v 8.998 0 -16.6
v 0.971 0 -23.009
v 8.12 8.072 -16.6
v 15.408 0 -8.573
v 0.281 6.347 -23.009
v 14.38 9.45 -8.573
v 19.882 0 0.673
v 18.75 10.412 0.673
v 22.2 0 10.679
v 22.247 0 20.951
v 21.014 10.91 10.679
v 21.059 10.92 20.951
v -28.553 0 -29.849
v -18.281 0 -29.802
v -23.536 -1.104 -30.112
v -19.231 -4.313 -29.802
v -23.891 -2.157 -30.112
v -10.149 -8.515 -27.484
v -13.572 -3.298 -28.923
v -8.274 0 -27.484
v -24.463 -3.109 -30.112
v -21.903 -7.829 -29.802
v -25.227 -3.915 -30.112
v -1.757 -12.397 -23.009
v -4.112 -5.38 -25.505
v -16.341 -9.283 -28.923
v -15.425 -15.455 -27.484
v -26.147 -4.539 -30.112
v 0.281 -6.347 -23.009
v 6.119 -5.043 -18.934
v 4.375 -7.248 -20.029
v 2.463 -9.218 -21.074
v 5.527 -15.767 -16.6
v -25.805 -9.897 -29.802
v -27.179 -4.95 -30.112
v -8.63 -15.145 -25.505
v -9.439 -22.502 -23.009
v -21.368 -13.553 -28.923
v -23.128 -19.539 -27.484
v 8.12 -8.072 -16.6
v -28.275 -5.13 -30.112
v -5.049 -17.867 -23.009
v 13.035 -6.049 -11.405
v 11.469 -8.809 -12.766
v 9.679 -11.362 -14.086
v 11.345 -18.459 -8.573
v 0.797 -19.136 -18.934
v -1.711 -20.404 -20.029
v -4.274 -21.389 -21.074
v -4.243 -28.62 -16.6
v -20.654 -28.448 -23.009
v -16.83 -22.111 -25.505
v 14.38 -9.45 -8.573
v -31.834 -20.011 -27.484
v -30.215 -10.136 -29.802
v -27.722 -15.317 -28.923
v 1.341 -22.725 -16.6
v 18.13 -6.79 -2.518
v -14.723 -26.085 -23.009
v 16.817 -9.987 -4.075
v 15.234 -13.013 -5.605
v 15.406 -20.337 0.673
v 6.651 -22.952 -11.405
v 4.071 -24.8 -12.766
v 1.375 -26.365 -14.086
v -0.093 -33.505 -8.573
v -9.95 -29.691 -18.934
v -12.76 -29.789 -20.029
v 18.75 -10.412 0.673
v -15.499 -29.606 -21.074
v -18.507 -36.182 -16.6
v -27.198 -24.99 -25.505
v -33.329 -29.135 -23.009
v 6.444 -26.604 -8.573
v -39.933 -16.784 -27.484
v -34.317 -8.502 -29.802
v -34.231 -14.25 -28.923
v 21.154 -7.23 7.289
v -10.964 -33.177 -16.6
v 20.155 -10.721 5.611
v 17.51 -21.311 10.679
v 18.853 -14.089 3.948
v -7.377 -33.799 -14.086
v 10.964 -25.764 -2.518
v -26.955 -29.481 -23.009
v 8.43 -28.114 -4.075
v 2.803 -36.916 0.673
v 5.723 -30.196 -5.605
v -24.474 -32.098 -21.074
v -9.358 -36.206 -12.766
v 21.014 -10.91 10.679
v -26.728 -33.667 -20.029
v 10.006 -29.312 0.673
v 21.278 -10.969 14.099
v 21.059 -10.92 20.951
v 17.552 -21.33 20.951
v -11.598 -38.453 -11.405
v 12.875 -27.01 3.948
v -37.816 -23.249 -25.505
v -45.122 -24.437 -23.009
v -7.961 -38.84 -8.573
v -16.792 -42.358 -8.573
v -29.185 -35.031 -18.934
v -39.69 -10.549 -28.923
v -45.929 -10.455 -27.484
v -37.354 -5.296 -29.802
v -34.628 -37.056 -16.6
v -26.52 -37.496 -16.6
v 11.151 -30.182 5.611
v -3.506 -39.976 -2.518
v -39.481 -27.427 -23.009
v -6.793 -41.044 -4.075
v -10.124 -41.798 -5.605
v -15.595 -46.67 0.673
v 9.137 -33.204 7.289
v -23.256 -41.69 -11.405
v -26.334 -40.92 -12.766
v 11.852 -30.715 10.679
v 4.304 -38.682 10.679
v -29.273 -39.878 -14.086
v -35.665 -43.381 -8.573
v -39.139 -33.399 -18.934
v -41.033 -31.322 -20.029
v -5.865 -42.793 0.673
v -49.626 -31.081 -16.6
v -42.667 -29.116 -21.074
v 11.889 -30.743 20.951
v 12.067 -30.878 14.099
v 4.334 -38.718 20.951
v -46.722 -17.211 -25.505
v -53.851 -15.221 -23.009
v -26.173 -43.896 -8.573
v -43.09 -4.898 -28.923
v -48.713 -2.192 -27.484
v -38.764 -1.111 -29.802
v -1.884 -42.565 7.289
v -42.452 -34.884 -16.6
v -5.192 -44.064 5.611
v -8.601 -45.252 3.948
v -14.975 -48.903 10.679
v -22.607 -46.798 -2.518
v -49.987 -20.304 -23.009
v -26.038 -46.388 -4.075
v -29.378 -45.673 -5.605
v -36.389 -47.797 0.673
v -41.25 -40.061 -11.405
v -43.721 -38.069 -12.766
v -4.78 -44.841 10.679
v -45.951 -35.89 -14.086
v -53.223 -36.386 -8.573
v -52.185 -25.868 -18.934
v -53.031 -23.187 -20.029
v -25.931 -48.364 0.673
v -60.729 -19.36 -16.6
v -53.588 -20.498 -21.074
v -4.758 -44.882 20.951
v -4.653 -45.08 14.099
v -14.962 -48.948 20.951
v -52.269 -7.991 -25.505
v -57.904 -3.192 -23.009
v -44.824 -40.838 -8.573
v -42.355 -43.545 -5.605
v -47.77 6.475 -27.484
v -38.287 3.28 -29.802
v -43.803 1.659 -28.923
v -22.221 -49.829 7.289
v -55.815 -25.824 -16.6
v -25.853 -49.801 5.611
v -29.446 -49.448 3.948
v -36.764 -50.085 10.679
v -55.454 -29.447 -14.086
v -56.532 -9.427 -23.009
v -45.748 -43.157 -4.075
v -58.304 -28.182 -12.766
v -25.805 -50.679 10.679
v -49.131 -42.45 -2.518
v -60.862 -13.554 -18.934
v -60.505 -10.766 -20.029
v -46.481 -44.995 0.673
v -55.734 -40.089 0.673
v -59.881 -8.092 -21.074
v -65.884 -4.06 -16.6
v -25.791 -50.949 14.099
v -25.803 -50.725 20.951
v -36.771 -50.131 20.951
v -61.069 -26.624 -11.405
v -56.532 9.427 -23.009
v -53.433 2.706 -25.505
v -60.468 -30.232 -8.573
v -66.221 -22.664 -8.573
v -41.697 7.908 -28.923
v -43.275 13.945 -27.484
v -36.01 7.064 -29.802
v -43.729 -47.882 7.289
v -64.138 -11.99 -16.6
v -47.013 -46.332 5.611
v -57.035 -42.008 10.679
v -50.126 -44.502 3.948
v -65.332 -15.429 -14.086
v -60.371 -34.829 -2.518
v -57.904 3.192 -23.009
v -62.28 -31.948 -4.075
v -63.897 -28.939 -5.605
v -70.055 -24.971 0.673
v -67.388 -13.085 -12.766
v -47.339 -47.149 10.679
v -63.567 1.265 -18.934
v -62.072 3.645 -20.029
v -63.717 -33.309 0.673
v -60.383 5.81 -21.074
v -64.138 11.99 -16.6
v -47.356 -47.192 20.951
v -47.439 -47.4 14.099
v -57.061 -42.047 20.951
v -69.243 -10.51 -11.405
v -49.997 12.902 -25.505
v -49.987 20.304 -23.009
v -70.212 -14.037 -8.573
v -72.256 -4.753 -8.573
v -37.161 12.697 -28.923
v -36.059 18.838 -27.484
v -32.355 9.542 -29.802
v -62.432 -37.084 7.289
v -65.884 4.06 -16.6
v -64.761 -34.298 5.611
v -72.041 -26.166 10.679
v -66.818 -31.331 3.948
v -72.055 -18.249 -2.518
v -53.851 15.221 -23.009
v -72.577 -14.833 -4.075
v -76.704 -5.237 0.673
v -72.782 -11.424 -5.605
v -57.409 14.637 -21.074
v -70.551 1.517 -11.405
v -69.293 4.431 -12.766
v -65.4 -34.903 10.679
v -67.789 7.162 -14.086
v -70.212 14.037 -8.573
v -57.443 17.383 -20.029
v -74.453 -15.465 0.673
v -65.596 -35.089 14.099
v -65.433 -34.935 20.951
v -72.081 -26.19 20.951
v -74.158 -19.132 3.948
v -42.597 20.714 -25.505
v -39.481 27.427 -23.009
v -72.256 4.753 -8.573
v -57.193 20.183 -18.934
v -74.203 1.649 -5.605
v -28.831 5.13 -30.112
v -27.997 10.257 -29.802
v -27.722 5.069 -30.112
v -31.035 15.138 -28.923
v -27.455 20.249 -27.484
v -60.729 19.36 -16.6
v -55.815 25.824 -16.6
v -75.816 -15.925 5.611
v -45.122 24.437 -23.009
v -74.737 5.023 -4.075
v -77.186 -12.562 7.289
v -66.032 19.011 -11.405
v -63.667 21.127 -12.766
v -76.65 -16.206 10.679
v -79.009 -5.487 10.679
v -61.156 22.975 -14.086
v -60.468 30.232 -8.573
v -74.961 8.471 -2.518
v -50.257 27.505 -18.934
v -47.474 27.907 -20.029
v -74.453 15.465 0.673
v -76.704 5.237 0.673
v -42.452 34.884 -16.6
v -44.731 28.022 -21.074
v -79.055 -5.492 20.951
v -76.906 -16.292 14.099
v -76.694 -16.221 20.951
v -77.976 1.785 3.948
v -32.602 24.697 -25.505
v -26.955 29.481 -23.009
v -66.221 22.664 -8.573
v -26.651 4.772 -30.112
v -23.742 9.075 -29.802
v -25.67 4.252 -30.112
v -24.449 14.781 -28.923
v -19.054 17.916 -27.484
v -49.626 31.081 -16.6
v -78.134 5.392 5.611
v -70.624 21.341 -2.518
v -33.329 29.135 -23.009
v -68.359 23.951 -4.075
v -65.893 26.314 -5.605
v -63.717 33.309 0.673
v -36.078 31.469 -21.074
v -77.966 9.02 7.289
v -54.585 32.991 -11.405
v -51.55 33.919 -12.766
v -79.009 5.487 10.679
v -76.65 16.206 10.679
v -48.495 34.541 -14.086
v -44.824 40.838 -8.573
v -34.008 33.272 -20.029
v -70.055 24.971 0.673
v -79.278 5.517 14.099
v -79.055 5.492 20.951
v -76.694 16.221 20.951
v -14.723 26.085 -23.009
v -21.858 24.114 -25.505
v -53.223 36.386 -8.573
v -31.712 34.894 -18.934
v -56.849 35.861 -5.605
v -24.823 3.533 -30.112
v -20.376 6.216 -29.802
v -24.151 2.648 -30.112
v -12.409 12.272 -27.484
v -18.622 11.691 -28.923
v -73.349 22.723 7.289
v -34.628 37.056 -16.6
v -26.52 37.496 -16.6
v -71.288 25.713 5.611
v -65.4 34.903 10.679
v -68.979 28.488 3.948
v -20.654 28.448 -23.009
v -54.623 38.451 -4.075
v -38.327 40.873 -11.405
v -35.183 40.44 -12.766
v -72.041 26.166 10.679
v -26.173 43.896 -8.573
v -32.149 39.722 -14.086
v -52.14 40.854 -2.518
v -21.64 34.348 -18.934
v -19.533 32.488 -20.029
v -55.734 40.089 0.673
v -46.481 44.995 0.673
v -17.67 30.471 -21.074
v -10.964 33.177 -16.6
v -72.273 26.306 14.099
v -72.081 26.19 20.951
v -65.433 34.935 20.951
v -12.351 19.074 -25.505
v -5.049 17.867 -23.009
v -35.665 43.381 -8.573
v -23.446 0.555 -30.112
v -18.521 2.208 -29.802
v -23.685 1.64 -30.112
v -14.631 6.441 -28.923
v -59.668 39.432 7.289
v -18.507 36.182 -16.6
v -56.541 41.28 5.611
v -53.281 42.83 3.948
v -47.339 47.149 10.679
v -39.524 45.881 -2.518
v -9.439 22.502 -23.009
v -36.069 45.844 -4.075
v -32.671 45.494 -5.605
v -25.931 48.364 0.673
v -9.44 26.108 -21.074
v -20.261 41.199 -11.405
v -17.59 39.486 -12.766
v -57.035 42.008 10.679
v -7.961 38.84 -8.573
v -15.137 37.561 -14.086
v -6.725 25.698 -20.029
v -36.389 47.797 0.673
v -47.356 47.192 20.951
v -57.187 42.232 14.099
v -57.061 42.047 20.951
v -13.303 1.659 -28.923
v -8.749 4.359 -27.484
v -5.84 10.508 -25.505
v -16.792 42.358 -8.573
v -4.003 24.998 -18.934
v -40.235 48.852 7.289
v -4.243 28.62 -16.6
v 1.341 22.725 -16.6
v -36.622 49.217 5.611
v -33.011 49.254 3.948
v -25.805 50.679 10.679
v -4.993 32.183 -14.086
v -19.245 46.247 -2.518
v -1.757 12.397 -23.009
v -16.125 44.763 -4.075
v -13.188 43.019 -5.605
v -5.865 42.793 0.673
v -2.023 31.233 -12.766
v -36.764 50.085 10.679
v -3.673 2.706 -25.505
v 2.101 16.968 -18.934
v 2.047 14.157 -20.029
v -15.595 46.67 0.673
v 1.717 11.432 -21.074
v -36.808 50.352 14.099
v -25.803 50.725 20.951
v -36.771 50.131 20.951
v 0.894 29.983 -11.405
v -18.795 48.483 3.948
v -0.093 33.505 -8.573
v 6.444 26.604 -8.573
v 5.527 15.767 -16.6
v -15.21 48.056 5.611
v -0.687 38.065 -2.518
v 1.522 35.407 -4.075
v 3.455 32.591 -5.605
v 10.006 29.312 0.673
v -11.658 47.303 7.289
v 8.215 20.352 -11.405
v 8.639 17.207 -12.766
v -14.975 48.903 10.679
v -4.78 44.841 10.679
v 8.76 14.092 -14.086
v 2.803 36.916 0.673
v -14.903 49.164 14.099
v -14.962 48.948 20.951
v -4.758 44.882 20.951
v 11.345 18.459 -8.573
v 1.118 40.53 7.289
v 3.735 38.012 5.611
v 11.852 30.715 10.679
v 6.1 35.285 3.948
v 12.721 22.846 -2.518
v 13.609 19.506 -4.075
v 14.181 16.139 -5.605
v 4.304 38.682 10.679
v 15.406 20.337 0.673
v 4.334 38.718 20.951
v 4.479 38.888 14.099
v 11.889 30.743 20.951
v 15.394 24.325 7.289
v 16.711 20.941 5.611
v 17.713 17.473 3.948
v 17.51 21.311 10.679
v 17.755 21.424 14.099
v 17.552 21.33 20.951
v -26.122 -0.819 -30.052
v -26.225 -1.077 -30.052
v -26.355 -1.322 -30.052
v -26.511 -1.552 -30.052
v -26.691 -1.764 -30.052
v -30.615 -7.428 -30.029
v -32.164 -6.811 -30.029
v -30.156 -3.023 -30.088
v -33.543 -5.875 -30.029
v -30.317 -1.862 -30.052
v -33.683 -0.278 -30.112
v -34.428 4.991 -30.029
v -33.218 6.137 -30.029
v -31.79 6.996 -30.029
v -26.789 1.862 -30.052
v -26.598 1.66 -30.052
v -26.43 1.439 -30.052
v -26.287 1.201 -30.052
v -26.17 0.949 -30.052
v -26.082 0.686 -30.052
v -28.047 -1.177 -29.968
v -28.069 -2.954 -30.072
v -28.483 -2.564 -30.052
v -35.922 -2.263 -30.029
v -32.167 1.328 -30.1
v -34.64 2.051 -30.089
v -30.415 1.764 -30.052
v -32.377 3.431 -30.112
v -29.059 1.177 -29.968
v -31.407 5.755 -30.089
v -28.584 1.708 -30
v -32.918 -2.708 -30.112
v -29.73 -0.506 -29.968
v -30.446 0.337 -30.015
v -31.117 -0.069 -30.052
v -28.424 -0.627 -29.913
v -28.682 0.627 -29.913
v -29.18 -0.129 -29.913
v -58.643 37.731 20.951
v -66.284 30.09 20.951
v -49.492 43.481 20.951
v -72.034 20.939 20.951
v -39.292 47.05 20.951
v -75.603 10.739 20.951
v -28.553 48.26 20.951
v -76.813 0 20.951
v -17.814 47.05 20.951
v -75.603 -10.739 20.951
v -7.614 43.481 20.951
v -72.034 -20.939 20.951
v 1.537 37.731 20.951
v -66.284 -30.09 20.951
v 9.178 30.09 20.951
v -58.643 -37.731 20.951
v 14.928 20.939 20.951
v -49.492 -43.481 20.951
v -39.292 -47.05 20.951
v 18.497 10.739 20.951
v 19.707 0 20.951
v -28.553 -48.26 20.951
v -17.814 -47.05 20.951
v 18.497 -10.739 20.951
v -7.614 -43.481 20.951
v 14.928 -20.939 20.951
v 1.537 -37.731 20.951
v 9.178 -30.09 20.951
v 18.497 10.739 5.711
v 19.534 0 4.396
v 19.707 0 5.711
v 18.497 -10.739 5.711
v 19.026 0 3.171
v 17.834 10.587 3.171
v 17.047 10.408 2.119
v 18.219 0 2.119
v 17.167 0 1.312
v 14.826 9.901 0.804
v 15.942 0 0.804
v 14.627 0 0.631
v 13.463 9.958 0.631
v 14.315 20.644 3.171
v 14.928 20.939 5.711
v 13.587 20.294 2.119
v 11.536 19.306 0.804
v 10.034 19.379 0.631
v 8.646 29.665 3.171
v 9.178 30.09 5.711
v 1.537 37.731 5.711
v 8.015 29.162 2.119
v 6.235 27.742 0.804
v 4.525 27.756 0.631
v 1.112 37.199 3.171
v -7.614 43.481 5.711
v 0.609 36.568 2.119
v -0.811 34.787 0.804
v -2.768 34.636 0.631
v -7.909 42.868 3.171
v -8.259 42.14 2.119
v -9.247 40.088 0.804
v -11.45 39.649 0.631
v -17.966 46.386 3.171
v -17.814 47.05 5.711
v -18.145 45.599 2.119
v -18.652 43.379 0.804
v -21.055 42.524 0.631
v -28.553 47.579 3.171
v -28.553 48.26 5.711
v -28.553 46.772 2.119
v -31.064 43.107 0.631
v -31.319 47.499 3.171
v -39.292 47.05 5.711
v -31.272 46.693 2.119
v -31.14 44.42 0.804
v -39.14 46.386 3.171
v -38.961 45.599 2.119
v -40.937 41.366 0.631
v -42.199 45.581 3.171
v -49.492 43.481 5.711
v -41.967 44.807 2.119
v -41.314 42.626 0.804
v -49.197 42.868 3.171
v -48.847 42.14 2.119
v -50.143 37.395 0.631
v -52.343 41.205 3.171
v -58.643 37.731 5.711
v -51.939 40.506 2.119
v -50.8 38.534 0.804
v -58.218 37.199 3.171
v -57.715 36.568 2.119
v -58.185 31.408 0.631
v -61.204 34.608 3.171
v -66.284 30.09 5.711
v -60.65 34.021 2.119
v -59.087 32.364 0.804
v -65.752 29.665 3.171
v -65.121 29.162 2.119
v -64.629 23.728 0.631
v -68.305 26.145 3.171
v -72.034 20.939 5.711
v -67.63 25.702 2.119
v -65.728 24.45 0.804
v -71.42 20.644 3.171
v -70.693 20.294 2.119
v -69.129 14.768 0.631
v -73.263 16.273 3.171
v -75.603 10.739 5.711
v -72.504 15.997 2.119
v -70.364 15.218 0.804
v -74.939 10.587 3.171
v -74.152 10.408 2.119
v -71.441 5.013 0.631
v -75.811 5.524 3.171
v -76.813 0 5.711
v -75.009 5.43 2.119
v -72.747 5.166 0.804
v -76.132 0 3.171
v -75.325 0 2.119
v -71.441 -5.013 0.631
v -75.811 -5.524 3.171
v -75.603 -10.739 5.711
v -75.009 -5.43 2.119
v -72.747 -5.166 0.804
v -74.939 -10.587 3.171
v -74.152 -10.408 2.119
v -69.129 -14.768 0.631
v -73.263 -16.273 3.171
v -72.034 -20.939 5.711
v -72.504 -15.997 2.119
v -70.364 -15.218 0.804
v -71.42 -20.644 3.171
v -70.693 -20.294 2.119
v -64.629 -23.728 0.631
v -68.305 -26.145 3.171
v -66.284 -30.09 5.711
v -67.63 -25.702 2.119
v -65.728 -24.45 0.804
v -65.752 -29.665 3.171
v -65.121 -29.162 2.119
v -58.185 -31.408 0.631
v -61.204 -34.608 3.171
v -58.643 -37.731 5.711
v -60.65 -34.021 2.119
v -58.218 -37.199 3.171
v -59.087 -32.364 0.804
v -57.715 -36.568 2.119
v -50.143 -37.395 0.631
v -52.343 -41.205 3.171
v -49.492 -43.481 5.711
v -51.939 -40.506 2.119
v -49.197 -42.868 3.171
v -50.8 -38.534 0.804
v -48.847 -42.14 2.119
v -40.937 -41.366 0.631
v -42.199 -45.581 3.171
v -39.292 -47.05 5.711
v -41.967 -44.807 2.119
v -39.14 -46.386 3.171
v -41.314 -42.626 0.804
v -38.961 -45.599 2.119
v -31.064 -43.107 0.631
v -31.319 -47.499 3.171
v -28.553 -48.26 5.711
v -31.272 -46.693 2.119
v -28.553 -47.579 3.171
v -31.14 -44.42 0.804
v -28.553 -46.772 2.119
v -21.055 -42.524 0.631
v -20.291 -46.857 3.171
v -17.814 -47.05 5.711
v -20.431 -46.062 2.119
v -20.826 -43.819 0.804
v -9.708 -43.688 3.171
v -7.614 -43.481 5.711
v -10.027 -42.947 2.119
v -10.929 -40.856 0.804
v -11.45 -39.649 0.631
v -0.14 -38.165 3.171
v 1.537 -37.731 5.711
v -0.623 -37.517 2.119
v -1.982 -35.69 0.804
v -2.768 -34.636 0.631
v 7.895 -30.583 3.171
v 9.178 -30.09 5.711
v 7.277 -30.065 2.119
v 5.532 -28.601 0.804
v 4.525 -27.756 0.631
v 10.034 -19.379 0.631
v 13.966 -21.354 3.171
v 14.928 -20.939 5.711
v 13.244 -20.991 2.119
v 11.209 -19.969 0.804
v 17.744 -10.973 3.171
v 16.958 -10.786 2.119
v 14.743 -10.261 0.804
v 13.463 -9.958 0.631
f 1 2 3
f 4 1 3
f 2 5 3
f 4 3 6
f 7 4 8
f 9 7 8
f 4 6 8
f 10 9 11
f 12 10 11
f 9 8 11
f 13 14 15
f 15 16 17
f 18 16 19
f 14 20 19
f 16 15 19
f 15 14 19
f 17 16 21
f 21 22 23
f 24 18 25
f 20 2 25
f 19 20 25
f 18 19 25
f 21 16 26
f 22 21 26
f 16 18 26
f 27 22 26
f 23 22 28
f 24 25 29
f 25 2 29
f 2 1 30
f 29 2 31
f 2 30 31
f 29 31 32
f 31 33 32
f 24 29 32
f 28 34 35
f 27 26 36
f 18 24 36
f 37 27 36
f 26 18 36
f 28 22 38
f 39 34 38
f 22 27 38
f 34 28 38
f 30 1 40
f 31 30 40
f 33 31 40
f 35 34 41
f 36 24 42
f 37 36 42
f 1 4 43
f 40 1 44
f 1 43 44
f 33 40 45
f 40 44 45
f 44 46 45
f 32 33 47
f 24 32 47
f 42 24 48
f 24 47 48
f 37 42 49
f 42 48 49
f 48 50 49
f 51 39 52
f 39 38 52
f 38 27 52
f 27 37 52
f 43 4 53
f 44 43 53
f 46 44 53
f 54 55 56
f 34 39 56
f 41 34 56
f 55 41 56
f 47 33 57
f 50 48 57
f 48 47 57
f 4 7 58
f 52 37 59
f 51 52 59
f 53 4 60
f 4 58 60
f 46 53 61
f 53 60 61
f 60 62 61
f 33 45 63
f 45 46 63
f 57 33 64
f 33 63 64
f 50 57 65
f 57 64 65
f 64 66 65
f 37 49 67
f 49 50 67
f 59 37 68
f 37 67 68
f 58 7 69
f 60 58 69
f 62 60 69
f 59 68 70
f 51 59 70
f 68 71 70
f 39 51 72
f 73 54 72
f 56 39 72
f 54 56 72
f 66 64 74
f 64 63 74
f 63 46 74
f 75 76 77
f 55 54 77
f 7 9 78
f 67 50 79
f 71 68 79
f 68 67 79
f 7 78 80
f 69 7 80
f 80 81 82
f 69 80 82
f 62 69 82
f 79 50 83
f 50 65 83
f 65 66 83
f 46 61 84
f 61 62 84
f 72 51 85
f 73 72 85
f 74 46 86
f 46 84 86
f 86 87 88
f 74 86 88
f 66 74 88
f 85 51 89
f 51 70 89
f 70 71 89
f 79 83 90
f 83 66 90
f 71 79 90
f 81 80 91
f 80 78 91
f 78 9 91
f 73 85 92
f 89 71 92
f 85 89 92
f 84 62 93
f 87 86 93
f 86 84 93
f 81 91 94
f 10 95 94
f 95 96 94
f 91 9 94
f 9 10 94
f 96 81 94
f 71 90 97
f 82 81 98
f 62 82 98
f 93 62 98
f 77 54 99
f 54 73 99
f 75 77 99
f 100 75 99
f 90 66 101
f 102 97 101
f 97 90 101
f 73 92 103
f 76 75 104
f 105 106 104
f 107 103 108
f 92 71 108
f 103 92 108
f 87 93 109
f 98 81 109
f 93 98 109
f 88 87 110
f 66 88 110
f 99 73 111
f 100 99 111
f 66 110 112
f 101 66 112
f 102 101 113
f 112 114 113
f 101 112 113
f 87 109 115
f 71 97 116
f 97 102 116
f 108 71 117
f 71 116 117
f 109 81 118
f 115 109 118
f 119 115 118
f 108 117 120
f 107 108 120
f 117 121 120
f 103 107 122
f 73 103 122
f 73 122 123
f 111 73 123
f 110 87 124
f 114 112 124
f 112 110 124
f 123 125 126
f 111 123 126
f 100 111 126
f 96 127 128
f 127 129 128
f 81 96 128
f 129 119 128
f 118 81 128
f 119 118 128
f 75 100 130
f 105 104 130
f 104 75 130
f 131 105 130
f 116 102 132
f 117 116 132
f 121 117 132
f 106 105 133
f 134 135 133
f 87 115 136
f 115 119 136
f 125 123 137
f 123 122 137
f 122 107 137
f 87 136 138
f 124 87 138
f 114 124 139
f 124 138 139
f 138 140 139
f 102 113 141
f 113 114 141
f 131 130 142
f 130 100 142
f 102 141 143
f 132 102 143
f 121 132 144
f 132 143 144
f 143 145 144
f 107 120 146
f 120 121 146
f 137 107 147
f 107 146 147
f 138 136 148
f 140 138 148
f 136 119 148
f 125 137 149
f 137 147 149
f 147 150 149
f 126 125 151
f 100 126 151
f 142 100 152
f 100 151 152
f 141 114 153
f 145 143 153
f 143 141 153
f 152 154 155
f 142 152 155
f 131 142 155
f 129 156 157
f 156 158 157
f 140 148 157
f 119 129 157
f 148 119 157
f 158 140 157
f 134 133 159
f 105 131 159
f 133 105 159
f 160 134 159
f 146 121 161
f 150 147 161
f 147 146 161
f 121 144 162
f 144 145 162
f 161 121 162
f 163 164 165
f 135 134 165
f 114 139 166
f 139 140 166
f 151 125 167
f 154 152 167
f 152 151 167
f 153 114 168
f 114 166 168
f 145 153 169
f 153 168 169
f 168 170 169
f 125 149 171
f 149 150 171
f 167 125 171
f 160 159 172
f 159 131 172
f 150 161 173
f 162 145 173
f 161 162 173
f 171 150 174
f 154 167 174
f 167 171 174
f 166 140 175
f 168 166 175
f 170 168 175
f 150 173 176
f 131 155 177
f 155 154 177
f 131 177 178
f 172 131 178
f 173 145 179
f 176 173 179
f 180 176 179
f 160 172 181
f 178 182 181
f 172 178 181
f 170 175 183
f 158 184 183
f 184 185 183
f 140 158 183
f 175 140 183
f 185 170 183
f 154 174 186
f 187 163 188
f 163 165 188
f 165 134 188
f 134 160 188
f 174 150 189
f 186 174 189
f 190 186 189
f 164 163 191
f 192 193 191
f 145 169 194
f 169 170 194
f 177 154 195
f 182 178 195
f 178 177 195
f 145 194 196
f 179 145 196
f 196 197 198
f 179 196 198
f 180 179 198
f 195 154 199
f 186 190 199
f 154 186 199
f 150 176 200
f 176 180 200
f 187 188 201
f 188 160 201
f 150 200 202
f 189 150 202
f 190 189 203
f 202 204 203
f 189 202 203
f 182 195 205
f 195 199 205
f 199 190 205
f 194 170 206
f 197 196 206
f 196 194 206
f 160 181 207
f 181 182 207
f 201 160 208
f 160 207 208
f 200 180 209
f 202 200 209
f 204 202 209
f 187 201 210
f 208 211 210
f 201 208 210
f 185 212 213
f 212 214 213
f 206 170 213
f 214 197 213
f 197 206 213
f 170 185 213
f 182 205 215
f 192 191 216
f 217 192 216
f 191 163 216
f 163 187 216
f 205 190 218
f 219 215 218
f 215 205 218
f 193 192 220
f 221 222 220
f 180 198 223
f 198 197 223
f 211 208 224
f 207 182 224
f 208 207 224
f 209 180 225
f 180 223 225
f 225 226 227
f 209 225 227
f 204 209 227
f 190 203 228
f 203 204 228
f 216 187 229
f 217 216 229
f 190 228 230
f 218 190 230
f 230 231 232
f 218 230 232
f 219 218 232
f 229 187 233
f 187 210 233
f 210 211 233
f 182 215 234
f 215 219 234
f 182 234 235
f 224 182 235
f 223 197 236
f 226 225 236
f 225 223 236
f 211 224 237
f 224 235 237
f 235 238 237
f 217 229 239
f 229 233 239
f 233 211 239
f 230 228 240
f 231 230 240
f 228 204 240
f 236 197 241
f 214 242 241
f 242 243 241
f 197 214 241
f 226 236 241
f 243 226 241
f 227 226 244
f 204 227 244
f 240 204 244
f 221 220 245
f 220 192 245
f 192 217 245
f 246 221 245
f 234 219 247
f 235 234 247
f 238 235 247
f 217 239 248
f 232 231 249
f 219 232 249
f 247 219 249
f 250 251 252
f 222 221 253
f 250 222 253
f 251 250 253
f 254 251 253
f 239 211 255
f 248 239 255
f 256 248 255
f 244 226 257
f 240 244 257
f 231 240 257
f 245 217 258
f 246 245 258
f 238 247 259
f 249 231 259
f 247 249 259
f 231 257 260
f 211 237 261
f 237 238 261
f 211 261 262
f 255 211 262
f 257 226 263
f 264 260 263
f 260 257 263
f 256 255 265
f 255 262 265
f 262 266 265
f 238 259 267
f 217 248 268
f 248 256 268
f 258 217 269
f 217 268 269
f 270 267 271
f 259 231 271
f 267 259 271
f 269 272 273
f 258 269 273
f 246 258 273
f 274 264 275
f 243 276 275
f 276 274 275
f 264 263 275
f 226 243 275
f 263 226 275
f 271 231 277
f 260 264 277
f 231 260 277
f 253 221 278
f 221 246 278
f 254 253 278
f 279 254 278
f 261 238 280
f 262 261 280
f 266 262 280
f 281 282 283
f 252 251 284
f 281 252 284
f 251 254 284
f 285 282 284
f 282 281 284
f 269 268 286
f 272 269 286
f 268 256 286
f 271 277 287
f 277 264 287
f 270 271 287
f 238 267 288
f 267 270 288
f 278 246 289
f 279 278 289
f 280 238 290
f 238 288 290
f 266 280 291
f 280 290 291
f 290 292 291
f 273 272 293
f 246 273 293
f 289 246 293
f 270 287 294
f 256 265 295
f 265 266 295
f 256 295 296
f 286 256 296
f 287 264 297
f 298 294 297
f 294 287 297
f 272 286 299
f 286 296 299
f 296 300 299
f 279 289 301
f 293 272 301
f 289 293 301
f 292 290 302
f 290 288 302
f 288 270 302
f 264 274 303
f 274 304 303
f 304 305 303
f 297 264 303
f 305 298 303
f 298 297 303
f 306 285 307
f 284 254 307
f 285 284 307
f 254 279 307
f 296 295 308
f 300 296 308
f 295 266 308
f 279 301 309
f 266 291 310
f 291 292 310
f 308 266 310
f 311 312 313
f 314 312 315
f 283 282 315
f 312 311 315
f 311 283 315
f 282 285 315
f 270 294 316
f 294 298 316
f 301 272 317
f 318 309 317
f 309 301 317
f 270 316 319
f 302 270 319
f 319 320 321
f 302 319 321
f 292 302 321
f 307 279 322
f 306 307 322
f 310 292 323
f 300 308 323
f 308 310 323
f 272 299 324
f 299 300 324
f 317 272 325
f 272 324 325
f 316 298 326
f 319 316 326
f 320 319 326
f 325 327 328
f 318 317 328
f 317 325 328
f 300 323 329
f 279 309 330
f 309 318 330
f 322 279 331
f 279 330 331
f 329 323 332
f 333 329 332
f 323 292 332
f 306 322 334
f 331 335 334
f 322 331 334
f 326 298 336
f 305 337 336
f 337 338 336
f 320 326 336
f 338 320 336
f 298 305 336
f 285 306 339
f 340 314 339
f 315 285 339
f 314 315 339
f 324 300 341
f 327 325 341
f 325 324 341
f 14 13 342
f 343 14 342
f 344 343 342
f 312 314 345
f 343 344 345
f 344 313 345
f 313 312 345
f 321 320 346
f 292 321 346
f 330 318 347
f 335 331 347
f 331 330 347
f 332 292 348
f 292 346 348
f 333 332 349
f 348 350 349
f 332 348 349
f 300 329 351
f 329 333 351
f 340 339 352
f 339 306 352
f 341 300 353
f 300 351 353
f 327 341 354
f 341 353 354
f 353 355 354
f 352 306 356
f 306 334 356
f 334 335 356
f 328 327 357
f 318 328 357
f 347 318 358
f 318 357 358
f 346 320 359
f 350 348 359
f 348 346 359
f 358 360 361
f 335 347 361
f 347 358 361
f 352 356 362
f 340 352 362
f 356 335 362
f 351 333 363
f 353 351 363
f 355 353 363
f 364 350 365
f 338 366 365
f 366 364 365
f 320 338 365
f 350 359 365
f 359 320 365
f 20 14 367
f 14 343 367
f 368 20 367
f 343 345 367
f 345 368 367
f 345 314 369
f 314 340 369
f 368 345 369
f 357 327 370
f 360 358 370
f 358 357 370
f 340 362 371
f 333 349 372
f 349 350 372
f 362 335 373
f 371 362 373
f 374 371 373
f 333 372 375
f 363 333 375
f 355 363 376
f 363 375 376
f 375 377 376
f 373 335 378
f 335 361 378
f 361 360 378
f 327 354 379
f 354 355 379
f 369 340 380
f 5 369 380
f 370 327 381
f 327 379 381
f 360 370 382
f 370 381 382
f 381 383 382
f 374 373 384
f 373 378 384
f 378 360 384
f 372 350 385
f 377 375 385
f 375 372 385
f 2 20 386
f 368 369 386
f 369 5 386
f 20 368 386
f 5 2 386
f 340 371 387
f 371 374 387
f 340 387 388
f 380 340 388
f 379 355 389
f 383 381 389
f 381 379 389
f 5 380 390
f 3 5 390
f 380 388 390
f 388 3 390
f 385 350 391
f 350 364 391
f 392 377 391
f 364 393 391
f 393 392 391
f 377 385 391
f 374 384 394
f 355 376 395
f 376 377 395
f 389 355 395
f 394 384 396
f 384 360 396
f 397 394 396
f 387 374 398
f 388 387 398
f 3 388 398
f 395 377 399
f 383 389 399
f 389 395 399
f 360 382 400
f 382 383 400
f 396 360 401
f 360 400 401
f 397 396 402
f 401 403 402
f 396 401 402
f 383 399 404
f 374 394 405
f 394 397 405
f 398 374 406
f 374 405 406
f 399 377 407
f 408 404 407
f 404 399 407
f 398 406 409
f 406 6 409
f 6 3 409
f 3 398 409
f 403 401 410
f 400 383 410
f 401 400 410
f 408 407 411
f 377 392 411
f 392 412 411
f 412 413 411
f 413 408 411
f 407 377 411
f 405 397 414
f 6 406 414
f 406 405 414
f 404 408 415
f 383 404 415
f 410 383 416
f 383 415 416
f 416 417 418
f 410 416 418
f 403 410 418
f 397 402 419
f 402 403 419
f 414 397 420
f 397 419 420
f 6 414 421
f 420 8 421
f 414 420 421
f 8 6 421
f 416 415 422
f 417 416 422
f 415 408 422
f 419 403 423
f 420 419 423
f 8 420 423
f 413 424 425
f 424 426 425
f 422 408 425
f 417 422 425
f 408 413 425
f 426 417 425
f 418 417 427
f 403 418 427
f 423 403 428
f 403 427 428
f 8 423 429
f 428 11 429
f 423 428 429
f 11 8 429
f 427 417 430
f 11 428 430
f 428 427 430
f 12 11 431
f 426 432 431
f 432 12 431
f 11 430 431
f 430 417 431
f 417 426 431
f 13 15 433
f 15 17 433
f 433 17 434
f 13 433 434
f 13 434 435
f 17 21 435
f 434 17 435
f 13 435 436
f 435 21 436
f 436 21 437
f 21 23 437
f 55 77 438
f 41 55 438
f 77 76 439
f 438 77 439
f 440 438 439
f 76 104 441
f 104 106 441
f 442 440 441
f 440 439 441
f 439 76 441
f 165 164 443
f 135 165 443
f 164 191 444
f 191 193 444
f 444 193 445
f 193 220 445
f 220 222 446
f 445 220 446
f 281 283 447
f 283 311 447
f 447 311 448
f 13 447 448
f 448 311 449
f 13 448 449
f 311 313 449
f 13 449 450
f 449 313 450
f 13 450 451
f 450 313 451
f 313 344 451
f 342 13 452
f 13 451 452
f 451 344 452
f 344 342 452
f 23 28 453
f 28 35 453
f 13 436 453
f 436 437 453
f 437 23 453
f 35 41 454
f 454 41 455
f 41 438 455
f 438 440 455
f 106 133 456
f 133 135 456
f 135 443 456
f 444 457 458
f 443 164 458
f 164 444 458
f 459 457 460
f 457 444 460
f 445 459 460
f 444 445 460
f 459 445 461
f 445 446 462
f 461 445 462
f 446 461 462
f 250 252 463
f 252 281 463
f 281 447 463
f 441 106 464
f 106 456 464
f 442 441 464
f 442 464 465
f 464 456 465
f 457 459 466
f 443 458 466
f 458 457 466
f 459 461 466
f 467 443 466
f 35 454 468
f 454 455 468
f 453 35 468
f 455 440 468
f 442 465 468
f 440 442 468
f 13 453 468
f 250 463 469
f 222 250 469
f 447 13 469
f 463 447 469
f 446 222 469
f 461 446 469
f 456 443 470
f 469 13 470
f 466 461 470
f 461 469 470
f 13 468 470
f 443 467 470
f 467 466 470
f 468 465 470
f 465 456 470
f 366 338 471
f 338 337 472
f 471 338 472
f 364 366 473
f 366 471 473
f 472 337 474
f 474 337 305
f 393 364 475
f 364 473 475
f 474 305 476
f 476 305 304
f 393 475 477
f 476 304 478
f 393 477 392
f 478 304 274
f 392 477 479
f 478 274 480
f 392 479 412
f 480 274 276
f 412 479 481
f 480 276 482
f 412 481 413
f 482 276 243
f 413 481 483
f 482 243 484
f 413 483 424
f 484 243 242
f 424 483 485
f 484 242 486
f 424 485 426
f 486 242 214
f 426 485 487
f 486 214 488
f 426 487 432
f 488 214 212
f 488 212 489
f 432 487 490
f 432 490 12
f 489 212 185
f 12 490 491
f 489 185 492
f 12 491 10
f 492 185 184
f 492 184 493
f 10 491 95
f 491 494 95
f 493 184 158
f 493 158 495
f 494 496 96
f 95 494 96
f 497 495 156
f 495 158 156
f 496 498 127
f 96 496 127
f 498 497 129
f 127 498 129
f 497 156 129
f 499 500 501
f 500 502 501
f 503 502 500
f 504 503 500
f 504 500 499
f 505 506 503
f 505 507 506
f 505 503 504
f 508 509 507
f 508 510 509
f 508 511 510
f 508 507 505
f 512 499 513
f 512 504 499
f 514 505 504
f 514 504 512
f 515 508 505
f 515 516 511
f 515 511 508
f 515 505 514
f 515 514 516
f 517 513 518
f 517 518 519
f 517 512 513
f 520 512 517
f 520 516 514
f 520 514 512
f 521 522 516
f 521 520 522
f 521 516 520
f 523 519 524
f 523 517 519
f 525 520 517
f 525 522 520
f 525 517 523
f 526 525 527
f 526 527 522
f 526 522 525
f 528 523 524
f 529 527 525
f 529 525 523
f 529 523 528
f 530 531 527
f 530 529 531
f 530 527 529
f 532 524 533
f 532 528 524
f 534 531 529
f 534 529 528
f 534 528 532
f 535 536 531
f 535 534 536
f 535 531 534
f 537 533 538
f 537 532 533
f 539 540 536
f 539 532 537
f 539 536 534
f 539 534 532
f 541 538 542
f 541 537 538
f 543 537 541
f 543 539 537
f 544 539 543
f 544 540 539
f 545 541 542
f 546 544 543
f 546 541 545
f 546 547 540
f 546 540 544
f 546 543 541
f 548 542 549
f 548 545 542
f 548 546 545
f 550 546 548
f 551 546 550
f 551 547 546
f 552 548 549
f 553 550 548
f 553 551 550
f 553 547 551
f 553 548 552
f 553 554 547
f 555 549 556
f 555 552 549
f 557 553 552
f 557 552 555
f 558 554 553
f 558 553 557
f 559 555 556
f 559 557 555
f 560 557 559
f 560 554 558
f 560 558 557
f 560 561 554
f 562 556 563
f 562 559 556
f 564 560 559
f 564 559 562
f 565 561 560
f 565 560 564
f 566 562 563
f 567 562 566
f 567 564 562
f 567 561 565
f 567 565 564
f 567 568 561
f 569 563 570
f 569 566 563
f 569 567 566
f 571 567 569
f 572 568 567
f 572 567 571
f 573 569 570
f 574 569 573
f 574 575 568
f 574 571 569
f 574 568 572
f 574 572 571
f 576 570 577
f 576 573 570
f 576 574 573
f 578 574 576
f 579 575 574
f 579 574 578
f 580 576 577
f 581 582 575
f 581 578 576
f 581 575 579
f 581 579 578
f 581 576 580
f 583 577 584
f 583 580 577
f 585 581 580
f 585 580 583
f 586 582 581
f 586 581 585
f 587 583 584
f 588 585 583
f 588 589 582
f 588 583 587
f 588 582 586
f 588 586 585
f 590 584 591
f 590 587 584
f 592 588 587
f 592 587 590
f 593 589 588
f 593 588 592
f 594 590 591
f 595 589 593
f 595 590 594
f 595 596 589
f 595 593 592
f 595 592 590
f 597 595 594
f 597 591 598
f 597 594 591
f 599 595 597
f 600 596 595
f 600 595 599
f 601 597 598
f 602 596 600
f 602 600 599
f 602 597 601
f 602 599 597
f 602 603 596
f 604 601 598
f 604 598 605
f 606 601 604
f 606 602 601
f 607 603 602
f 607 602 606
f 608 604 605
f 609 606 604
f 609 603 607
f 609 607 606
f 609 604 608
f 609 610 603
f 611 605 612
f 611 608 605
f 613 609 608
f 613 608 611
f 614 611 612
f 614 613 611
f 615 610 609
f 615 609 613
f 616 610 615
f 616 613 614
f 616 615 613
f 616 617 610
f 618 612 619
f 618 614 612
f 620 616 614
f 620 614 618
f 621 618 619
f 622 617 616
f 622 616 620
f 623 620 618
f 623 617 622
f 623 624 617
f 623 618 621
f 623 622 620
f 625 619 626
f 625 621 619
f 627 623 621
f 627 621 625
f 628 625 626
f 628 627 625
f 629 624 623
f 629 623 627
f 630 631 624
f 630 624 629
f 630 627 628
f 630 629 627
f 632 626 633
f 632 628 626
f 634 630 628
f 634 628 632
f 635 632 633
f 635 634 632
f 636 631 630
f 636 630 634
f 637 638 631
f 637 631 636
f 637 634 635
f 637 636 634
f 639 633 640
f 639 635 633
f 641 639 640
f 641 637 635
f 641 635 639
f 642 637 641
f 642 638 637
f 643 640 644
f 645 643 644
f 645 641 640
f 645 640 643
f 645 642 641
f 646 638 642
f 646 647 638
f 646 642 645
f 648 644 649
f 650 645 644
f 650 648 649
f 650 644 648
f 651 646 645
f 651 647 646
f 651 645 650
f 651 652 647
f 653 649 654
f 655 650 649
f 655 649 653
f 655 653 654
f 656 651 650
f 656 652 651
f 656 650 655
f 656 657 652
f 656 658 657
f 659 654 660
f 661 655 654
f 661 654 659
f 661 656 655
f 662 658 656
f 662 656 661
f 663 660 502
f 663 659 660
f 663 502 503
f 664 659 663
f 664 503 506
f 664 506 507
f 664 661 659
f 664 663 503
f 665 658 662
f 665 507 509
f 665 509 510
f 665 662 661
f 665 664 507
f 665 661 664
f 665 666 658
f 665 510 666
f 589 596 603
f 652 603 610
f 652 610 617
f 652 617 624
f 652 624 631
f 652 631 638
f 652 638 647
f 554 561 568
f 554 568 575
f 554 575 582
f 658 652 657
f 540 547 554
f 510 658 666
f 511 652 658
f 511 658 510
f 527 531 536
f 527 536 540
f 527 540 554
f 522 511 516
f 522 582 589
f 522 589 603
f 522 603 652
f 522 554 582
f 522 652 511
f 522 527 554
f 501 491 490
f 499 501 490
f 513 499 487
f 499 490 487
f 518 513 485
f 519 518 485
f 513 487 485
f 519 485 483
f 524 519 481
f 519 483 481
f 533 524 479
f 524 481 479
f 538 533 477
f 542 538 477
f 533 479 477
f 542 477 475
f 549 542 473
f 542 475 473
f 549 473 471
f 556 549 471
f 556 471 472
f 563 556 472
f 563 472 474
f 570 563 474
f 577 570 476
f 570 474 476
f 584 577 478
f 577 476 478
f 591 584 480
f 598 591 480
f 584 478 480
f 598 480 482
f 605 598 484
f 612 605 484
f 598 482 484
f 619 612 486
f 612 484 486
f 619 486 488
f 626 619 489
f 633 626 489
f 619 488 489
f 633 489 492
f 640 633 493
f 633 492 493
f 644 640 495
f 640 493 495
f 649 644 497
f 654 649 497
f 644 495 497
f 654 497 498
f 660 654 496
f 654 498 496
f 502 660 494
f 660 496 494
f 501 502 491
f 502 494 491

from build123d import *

# Parameters (mm, degrees)
F2_R     = 48.26
F3_DEPTH = 20.32
F4_R     = 5.08


with BuildPart() as f1:
    # F0 (on Front) → F1 (revolve)
    with BuildSketch(Plane.XZ):
        with BuildLine():
            Line((22.247079, 20.951111), (-28.552921, 20.951111))
            Line((-28.552921, 20.951111), (-28.552921, -29.848889))
            ThreePointArc((-28.552921, -29.848889), (8.998086, -16.599896), (22.247079, 20.951111))
        make_face()
    revolve(axis=Axis((-28.552921, 0, -4.448889), (0, 0, -1)))

    # F2 (on face) → F3 (cut)
    with BuildSketch(Plane.XY.offset(20.951111)):
        with Locations((-28.552921, 0)):
            Circle(F2_R)
    extrude(amount=-F3_DEPTH, mode=Mode.SUBTRACT)

    # F4
    f4_edges = [f1.edges().sort_by_distance(p)[0] for p in [
        (-76.812921, 0, 0.631111),
    ]]
    fillet(f4_edges, radius=F4_R)


solid = f1.part
